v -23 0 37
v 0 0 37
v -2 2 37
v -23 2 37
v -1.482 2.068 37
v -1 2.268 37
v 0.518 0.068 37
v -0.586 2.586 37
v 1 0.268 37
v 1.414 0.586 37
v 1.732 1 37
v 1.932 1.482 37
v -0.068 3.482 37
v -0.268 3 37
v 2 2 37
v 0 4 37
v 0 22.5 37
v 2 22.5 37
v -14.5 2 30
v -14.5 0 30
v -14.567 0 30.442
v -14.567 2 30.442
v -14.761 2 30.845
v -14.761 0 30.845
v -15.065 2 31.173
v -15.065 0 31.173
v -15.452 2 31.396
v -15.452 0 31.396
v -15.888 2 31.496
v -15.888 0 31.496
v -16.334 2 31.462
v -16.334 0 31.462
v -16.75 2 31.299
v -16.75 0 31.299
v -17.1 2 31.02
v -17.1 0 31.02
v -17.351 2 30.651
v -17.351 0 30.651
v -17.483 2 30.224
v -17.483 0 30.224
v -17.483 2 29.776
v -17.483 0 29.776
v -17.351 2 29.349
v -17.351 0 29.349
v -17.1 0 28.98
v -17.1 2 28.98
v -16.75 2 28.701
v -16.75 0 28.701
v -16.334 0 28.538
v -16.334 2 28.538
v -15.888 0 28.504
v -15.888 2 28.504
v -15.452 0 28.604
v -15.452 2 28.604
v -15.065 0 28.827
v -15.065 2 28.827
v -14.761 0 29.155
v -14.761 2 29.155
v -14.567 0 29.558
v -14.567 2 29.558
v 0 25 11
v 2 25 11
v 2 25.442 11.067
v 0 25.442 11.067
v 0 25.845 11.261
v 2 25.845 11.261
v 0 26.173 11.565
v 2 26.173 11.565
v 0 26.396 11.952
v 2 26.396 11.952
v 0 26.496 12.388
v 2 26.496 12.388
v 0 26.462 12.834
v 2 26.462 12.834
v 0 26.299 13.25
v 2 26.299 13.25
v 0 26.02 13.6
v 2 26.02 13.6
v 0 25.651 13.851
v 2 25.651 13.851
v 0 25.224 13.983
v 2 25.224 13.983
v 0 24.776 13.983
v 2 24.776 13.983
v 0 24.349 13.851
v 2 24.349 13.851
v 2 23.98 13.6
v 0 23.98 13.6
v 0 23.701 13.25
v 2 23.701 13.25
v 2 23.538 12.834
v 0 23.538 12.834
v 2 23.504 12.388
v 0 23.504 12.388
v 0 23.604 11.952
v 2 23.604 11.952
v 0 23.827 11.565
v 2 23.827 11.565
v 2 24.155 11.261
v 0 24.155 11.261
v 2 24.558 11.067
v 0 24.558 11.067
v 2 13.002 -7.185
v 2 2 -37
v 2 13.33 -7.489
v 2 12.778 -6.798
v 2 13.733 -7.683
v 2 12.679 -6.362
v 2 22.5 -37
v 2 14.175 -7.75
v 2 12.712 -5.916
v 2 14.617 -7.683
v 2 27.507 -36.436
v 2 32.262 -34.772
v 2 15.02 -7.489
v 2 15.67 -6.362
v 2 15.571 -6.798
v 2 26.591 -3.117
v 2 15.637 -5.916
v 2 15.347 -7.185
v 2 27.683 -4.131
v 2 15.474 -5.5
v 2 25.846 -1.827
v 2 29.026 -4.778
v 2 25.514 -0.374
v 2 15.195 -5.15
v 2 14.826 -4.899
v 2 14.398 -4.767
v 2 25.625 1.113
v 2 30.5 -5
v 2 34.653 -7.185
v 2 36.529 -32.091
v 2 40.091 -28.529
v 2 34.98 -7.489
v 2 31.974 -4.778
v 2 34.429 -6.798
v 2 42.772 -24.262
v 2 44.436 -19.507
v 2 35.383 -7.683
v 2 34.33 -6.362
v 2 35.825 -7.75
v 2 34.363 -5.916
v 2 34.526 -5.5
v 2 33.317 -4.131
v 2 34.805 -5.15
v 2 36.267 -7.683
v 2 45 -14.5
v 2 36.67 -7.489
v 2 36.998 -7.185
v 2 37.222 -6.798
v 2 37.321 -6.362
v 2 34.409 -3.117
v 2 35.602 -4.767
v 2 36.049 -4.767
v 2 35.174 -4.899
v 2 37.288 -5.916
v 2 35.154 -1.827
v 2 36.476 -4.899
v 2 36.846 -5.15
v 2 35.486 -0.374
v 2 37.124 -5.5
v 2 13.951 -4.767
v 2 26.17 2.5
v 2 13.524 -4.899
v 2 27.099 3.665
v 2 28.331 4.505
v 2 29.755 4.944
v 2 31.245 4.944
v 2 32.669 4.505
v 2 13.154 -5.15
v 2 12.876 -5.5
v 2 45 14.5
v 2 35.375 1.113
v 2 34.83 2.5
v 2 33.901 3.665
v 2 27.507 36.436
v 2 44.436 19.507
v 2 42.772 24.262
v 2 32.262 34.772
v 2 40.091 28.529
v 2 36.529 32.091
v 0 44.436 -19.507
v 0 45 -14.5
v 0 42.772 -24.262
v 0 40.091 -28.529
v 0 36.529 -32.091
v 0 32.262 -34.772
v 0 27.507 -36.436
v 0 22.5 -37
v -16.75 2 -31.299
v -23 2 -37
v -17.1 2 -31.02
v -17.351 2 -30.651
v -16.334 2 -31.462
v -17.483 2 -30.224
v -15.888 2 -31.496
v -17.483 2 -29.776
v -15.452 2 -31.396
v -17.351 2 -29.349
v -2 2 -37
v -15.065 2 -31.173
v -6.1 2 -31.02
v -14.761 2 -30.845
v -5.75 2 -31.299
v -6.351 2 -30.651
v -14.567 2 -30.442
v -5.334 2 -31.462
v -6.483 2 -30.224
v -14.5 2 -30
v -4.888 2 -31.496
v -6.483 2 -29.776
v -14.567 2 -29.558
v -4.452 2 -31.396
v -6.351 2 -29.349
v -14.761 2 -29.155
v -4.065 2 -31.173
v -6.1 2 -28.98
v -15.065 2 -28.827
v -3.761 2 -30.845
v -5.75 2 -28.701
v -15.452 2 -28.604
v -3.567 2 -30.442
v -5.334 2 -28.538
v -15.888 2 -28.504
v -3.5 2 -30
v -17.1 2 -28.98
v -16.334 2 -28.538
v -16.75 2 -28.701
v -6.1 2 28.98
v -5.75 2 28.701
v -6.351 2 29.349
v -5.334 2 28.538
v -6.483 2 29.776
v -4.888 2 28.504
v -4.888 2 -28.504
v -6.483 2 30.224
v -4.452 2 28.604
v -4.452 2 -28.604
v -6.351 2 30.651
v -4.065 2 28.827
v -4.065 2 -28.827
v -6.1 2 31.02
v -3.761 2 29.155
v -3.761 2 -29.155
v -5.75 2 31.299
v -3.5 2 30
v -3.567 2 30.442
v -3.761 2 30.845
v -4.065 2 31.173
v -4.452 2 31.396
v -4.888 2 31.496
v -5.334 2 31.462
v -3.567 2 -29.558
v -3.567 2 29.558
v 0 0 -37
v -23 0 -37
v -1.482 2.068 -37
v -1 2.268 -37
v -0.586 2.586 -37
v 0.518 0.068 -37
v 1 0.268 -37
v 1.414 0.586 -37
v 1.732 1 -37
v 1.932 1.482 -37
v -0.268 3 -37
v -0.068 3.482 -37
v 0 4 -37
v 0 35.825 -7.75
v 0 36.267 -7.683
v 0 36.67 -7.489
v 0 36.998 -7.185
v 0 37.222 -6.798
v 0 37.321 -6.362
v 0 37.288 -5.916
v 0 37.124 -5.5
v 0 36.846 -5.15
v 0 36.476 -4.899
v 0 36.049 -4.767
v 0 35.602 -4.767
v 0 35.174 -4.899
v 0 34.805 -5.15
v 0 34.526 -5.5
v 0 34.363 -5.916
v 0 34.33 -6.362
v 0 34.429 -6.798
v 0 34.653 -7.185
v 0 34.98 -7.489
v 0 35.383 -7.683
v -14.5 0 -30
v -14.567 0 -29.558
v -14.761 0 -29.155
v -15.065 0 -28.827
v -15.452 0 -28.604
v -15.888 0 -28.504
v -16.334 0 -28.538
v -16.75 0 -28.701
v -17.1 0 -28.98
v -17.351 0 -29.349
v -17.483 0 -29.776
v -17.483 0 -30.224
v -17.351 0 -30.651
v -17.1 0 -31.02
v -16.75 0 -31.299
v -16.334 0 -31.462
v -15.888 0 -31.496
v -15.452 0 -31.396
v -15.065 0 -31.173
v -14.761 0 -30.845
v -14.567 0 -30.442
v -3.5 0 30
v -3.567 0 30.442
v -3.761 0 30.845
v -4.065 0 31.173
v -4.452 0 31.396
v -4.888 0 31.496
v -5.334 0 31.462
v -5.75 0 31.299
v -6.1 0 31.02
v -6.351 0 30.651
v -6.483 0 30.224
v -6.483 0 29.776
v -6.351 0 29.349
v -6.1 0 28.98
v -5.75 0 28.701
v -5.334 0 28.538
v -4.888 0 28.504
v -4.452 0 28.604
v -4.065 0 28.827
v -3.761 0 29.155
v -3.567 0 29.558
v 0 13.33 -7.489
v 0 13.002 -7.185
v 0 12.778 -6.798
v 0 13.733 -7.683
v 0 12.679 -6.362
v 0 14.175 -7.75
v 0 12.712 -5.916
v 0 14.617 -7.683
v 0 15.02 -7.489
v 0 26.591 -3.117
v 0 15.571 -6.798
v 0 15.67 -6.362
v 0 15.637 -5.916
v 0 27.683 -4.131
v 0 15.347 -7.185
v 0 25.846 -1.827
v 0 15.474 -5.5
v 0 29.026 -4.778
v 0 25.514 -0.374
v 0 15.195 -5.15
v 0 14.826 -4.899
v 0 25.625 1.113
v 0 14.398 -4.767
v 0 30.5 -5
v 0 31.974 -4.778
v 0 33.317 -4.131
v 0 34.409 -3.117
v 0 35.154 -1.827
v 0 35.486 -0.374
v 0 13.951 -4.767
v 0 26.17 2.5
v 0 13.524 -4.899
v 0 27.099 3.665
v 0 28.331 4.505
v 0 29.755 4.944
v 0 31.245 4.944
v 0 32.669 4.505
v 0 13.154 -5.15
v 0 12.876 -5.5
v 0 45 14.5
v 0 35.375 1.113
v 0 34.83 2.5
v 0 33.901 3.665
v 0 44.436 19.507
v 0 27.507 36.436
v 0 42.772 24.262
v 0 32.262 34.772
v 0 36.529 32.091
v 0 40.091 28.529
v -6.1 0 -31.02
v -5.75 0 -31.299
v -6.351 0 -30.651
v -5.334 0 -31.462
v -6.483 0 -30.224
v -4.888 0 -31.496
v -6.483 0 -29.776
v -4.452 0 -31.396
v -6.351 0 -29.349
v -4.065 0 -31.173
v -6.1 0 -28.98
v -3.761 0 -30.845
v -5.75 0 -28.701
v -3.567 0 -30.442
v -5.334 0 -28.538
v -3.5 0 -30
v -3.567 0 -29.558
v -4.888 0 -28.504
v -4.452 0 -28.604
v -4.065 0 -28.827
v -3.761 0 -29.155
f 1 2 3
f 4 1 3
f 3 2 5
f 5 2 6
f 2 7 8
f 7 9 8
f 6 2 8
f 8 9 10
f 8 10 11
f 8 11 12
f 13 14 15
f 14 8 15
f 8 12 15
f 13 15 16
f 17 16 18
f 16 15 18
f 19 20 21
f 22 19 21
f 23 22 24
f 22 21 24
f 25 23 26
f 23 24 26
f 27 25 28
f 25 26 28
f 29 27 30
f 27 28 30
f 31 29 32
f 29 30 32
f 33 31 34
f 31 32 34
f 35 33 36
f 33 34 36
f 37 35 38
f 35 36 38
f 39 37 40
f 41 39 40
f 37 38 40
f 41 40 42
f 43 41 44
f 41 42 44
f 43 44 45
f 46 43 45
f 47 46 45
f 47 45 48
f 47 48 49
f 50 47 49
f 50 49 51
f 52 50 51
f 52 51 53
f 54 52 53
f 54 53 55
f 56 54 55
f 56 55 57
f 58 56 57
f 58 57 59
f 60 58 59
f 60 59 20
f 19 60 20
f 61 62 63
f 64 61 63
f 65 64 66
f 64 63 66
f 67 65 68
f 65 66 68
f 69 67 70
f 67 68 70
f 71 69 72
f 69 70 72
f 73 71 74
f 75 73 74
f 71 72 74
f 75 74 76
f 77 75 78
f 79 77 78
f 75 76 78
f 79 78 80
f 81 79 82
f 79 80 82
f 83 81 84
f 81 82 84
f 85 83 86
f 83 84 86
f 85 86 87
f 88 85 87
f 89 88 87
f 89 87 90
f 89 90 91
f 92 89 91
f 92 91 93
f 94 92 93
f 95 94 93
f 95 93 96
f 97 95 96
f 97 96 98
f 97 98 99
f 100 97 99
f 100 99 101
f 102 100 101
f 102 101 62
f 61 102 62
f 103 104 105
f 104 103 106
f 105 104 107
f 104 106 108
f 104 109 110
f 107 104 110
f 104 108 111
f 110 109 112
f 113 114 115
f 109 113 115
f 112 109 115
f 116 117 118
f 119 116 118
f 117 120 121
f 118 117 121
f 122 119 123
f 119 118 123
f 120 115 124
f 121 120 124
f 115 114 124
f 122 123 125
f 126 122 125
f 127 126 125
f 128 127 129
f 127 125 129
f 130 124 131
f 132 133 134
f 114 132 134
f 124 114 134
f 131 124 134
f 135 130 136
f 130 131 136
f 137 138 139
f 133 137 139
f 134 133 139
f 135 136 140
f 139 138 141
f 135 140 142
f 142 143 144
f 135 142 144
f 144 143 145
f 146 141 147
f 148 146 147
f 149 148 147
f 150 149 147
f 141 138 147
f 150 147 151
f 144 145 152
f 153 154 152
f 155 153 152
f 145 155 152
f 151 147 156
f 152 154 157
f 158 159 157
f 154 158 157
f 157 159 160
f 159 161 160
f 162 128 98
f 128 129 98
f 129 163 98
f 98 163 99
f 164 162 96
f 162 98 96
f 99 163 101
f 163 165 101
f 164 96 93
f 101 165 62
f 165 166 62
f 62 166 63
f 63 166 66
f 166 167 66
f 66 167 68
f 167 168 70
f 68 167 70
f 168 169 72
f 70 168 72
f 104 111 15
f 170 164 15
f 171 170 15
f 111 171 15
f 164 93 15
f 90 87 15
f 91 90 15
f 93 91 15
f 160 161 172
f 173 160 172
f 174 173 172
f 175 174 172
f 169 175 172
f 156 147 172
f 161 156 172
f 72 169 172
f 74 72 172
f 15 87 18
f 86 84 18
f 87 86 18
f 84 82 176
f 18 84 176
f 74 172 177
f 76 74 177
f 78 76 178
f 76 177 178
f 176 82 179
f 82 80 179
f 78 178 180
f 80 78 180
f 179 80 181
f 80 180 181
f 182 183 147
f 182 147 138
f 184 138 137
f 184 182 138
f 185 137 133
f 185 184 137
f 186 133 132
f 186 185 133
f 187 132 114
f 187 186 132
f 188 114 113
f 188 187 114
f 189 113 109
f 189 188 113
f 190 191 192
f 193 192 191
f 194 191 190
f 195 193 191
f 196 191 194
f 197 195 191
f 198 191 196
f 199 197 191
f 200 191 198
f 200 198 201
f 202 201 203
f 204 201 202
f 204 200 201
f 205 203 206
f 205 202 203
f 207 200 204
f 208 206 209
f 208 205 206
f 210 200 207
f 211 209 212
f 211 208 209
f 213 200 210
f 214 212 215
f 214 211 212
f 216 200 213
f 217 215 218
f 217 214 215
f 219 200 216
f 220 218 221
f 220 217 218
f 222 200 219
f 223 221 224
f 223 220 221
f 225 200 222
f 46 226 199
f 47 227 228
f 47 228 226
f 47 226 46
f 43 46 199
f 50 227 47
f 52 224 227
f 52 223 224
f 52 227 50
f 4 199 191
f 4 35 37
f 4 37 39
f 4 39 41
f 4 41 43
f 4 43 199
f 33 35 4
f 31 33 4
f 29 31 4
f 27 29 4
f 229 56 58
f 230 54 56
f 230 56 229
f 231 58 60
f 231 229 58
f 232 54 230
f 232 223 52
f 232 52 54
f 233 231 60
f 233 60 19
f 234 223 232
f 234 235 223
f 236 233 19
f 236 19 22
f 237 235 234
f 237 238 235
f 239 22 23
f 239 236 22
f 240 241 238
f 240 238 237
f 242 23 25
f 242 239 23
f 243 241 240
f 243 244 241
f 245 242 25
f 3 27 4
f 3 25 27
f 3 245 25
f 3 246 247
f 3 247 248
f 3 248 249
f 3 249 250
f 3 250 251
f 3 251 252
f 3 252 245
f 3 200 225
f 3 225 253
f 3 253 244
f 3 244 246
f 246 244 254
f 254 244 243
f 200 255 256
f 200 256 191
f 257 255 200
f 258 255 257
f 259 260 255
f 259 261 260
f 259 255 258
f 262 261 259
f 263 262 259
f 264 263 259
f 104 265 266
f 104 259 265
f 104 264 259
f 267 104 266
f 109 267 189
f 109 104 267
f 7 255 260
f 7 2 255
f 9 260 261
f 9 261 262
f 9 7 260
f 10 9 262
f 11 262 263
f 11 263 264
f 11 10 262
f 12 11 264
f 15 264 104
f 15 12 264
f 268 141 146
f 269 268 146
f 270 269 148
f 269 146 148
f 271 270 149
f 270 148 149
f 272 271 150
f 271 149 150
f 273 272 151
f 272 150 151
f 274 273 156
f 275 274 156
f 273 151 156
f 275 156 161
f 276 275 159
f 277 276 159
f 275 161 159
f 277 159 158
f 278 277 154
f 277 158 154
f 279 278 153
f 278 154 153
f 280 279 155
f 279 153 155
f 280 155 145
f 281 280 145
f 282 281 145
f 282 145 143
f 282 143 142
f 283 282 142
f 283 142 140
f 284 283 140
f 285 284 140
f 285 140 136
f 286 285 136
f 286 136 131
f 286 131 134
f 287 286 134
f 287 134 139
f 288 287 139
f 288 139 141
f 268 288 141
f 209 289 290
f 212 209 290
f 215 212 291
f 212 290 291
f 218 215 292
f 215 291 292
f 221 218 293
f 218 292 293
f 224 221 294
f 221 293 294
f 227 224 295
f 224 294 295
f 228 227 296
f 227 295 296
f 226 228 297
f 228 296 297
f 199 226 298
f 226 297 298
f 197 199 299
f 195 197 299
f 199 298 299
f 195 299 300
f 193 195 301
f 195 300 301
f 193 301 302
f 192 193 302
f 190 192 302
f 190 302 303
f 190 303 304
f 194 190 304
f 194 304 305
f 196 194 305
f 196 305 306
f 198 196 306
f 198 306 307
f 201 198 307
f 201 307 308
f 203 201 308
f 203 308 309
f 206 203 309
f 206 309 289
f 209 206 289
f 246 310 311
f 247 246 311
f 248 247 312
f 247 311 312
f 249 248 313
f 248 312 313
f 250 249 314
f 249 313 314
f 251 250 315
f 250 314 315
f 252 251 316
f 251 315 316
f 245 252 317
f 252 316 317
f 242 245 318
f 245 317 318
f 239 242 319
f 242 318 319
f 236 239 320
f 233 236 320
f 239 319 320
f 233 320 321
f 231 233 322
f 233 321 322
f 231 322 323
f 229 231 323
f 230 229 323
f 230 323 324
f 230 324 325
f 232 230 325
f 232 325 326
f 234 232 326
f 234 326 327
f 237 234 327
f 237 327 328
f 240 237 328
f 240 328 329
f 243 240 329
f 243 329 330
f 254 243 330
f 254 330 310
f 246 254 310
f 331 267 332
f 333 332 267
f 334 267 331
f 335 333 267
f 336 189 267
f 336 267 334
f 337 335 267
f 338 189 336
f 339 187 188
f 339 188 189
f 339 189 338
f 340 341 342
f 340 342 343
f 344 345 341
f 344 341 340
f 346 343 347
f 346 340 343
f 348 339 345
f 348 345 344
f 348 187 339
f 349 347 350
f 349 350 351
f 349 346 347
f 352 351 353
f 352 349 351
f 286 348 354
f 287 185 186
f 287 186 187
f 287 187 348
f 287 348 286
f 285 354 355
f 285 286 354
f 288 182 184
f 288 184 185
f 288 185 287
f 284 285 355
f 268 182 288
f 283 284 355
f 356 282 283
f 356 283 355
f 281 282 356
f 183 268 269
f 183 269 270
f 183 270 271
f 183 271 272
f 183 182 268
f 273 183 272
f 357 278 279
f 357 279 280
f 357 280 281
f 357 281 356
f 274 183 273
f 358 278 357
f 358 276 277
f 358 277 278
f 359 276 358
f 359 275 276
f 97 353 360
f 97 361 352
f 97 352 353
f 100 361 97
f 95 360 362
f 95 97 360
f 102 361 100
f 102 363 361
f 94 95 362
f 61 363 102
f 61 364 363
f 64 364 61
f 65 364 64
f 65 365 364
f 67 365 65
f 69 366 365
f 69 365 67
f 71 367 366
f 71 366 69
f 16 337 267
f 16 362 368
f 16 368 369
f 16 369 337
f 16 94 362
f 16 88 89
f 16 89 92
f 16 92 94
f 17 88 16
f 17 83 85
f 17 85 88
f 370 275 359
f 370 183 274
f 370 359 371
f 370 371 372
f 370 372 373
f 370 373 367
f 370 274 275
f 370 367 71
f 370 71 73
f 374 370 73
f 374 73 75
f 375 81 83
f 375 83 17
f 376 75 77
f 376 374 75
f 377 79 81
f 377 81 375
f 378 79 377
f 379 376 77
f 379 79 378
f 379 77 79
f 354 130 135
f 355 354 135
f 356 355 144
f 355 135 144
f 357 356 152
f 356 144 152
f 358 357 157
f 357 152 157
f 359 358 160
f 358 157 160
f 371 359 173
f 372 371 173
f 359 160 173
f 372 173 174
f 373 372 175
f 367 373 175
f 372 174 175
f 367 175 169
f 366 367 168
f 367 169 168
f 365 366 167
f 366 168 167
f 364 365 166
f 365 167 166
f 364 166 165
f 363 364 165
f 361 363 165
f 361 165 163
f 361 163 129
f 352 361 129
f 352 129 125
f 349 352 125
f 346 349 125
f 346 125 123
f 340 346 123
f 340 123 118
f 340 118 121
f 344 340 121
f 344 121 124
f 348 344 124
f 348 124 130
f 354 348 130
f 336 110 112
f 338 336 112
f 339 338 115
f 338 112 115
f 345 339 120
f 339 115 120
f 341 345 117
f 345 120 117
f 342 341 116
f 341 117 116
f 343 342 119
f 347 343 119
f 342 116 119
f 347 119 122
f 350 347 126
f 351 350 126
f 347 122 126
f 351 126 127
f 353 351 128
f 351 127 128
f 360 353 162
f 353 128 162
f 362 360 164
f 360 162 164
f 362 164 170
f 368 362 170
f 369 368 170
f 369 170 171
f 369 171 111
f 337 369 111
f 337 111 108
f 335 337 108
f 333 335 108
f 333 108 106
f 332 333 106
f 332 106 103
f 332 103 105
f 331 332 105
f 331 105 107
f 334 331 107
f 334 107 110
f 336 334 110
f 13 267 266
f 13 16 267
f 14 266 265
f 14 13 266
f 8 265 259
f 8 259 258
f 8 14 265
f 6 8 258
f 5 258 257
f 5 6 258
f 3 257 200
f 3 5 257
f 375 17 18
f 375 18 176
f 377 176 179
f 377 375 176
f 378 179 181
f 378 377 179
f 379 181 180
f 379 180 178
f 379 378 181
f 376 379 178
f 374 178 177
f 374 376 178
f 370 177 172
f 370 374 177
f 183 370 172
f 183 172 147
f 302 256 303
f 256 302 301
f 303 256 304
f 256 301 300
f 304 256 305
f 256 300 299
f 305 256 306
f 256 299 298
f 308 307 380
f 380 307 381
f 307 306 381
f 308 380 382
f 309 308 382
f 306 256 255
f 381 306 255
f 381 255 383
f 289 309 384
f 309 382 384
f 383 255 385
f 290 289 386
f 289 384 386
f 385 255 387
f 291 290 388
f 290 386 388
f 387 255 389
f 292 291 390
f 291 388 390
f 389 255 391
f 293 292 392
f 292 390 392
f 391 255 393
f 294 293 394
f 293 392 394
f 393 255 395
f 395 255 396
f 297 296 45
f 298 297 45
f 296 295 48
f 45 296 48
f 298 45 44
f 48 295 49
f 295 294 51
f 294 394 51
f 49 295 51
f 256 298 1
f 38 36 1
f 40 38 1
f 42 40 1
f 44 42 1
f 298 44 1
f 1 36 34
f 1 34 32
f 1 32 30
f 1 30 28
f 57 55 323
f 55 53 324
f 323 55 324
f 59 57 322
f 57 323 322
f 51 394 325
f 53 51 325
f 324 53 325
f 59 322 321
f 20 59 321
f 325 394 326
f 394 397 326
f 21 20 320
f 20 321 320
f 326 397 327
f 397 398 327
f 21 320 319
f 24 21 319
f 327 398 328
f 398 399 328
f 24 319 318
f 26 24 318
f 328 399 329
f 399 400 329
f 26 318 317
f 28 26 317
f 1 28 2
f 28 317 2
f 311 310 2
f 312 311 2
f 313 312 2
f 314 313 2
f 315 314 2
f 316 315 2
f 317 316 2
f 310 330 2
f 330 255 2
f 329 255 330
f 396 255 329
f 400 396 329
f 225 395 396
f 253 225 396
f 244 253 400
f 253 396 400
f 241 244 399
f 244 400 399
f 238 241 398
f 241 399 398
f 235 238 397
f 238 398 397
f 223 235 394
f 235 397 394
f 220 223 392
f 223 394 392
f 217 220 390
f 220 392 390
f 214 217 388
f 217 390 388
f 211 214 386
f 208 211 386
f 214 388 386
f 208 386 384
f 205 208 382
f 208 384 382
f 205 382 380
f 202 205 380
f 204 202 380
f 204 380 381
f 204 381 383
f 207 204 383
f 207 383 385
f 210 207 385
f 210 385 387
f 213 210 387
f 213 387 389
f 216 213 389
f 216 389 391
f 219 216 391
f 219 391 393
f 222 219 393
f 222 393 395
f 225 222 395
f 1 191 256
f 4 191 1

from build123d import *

# Parameters (mm, degrees)
BOSS_EXTRUDE1_DEPTH = 2
SKETCH2_W           = 74
SKETCH2_H           = 2
BOSS_EXTRUDE2_DEPTH = 23
FILLET1_R           = 2
SKETCH3_R           = 5
SKETCH3_R_2         = 1.5
CUT_EXTRUDE1_DEPTH  = 26
SKETCH5_R           = 1.5
CUT_EXTRUDE2_DEPTH  = 46


with BuildPart() as part:
    # Sketch1 → Boss-Extrude1 (new body)
    with BuildSketch(Plane(origin=(0, 0, 0), x_dir=(0, 0, -1), z_dir=(1, 0, 0))):
        with BuildLine():
            Line((-14.5, 45), (14.5, 45))
            ThreePointArc((14.5, 45), (30.409902577, 38.409902577), (37, 22.5))
            Line((37, 22.5), (37, 0))
            Line((37, 0), (-37, 0))
            Line((-37, 0), (-37, 22.5))
            ThreePointArc((-37, 22.5), (-30.409902577, 38.409902577), (-14.5, 45))
        make_face()
    extrude(amount=BOSS_EXTRUDE1_DEPTH)

    # Sketch2 → Boss-Extrude2 (add)
    with BuildSketch(Plane.ZY):
        with Locations((0, 1)):
            Rectangle(SKETCH2_W, SKETCH2_H)
    extrude(amount=BOSS_EXTRUDE2_DEPTH)

    # Fillet1
    fillet1_edges = [part.edges().sort_by_distance(p)[0] for p in [
        (2, 0, 0),
        (0, 2, 0),
    ]]
    fillet(fillet1_edges, radius=FILLET1_R)

    # Sketch3 → Cut-Extrude1 (cut, through all)
    with BuildSketch(Plane(origin=(2, 0, 0), x_dir=(0, 0, -1), z_dir=(1, 0, 0))):
        with Locations((0, 30.5)):
            Circle(SKETCH3_R)
        with Locations((6.25, 35.825317547)):
            Circle(SKETCH3_R_2)
        with Locations((6.25, 14.174682453)):
            Circle(SKETCH3_R_2)
        with Locations((-12.5, 25)):
            Circle(SKETCH3_R_2)
    extrude(amount=-CUT_EXTRUDE1_DEPTH, mode=Mode.SUBTRACT)

    # Sketch5 → Cut-Extrude2 (cut, through all)
    with BuildSketch(Plane.XZ):
        with Locations((-16, -30)):
            Circle(SKETCH5_R)
        with Locations((-5, -30)):
            Circle(SKETCH5_R)
        with Locations((-5, 30)):
            Circle(SKETCH5_R)
        with Locations((-16, 30)):
            Circle(SKETCH5_R)
    extrude(amount=-CUT_EXTRUDE2_DEPTH, mode=Mode.SUBTRACT)


solid = part.part
